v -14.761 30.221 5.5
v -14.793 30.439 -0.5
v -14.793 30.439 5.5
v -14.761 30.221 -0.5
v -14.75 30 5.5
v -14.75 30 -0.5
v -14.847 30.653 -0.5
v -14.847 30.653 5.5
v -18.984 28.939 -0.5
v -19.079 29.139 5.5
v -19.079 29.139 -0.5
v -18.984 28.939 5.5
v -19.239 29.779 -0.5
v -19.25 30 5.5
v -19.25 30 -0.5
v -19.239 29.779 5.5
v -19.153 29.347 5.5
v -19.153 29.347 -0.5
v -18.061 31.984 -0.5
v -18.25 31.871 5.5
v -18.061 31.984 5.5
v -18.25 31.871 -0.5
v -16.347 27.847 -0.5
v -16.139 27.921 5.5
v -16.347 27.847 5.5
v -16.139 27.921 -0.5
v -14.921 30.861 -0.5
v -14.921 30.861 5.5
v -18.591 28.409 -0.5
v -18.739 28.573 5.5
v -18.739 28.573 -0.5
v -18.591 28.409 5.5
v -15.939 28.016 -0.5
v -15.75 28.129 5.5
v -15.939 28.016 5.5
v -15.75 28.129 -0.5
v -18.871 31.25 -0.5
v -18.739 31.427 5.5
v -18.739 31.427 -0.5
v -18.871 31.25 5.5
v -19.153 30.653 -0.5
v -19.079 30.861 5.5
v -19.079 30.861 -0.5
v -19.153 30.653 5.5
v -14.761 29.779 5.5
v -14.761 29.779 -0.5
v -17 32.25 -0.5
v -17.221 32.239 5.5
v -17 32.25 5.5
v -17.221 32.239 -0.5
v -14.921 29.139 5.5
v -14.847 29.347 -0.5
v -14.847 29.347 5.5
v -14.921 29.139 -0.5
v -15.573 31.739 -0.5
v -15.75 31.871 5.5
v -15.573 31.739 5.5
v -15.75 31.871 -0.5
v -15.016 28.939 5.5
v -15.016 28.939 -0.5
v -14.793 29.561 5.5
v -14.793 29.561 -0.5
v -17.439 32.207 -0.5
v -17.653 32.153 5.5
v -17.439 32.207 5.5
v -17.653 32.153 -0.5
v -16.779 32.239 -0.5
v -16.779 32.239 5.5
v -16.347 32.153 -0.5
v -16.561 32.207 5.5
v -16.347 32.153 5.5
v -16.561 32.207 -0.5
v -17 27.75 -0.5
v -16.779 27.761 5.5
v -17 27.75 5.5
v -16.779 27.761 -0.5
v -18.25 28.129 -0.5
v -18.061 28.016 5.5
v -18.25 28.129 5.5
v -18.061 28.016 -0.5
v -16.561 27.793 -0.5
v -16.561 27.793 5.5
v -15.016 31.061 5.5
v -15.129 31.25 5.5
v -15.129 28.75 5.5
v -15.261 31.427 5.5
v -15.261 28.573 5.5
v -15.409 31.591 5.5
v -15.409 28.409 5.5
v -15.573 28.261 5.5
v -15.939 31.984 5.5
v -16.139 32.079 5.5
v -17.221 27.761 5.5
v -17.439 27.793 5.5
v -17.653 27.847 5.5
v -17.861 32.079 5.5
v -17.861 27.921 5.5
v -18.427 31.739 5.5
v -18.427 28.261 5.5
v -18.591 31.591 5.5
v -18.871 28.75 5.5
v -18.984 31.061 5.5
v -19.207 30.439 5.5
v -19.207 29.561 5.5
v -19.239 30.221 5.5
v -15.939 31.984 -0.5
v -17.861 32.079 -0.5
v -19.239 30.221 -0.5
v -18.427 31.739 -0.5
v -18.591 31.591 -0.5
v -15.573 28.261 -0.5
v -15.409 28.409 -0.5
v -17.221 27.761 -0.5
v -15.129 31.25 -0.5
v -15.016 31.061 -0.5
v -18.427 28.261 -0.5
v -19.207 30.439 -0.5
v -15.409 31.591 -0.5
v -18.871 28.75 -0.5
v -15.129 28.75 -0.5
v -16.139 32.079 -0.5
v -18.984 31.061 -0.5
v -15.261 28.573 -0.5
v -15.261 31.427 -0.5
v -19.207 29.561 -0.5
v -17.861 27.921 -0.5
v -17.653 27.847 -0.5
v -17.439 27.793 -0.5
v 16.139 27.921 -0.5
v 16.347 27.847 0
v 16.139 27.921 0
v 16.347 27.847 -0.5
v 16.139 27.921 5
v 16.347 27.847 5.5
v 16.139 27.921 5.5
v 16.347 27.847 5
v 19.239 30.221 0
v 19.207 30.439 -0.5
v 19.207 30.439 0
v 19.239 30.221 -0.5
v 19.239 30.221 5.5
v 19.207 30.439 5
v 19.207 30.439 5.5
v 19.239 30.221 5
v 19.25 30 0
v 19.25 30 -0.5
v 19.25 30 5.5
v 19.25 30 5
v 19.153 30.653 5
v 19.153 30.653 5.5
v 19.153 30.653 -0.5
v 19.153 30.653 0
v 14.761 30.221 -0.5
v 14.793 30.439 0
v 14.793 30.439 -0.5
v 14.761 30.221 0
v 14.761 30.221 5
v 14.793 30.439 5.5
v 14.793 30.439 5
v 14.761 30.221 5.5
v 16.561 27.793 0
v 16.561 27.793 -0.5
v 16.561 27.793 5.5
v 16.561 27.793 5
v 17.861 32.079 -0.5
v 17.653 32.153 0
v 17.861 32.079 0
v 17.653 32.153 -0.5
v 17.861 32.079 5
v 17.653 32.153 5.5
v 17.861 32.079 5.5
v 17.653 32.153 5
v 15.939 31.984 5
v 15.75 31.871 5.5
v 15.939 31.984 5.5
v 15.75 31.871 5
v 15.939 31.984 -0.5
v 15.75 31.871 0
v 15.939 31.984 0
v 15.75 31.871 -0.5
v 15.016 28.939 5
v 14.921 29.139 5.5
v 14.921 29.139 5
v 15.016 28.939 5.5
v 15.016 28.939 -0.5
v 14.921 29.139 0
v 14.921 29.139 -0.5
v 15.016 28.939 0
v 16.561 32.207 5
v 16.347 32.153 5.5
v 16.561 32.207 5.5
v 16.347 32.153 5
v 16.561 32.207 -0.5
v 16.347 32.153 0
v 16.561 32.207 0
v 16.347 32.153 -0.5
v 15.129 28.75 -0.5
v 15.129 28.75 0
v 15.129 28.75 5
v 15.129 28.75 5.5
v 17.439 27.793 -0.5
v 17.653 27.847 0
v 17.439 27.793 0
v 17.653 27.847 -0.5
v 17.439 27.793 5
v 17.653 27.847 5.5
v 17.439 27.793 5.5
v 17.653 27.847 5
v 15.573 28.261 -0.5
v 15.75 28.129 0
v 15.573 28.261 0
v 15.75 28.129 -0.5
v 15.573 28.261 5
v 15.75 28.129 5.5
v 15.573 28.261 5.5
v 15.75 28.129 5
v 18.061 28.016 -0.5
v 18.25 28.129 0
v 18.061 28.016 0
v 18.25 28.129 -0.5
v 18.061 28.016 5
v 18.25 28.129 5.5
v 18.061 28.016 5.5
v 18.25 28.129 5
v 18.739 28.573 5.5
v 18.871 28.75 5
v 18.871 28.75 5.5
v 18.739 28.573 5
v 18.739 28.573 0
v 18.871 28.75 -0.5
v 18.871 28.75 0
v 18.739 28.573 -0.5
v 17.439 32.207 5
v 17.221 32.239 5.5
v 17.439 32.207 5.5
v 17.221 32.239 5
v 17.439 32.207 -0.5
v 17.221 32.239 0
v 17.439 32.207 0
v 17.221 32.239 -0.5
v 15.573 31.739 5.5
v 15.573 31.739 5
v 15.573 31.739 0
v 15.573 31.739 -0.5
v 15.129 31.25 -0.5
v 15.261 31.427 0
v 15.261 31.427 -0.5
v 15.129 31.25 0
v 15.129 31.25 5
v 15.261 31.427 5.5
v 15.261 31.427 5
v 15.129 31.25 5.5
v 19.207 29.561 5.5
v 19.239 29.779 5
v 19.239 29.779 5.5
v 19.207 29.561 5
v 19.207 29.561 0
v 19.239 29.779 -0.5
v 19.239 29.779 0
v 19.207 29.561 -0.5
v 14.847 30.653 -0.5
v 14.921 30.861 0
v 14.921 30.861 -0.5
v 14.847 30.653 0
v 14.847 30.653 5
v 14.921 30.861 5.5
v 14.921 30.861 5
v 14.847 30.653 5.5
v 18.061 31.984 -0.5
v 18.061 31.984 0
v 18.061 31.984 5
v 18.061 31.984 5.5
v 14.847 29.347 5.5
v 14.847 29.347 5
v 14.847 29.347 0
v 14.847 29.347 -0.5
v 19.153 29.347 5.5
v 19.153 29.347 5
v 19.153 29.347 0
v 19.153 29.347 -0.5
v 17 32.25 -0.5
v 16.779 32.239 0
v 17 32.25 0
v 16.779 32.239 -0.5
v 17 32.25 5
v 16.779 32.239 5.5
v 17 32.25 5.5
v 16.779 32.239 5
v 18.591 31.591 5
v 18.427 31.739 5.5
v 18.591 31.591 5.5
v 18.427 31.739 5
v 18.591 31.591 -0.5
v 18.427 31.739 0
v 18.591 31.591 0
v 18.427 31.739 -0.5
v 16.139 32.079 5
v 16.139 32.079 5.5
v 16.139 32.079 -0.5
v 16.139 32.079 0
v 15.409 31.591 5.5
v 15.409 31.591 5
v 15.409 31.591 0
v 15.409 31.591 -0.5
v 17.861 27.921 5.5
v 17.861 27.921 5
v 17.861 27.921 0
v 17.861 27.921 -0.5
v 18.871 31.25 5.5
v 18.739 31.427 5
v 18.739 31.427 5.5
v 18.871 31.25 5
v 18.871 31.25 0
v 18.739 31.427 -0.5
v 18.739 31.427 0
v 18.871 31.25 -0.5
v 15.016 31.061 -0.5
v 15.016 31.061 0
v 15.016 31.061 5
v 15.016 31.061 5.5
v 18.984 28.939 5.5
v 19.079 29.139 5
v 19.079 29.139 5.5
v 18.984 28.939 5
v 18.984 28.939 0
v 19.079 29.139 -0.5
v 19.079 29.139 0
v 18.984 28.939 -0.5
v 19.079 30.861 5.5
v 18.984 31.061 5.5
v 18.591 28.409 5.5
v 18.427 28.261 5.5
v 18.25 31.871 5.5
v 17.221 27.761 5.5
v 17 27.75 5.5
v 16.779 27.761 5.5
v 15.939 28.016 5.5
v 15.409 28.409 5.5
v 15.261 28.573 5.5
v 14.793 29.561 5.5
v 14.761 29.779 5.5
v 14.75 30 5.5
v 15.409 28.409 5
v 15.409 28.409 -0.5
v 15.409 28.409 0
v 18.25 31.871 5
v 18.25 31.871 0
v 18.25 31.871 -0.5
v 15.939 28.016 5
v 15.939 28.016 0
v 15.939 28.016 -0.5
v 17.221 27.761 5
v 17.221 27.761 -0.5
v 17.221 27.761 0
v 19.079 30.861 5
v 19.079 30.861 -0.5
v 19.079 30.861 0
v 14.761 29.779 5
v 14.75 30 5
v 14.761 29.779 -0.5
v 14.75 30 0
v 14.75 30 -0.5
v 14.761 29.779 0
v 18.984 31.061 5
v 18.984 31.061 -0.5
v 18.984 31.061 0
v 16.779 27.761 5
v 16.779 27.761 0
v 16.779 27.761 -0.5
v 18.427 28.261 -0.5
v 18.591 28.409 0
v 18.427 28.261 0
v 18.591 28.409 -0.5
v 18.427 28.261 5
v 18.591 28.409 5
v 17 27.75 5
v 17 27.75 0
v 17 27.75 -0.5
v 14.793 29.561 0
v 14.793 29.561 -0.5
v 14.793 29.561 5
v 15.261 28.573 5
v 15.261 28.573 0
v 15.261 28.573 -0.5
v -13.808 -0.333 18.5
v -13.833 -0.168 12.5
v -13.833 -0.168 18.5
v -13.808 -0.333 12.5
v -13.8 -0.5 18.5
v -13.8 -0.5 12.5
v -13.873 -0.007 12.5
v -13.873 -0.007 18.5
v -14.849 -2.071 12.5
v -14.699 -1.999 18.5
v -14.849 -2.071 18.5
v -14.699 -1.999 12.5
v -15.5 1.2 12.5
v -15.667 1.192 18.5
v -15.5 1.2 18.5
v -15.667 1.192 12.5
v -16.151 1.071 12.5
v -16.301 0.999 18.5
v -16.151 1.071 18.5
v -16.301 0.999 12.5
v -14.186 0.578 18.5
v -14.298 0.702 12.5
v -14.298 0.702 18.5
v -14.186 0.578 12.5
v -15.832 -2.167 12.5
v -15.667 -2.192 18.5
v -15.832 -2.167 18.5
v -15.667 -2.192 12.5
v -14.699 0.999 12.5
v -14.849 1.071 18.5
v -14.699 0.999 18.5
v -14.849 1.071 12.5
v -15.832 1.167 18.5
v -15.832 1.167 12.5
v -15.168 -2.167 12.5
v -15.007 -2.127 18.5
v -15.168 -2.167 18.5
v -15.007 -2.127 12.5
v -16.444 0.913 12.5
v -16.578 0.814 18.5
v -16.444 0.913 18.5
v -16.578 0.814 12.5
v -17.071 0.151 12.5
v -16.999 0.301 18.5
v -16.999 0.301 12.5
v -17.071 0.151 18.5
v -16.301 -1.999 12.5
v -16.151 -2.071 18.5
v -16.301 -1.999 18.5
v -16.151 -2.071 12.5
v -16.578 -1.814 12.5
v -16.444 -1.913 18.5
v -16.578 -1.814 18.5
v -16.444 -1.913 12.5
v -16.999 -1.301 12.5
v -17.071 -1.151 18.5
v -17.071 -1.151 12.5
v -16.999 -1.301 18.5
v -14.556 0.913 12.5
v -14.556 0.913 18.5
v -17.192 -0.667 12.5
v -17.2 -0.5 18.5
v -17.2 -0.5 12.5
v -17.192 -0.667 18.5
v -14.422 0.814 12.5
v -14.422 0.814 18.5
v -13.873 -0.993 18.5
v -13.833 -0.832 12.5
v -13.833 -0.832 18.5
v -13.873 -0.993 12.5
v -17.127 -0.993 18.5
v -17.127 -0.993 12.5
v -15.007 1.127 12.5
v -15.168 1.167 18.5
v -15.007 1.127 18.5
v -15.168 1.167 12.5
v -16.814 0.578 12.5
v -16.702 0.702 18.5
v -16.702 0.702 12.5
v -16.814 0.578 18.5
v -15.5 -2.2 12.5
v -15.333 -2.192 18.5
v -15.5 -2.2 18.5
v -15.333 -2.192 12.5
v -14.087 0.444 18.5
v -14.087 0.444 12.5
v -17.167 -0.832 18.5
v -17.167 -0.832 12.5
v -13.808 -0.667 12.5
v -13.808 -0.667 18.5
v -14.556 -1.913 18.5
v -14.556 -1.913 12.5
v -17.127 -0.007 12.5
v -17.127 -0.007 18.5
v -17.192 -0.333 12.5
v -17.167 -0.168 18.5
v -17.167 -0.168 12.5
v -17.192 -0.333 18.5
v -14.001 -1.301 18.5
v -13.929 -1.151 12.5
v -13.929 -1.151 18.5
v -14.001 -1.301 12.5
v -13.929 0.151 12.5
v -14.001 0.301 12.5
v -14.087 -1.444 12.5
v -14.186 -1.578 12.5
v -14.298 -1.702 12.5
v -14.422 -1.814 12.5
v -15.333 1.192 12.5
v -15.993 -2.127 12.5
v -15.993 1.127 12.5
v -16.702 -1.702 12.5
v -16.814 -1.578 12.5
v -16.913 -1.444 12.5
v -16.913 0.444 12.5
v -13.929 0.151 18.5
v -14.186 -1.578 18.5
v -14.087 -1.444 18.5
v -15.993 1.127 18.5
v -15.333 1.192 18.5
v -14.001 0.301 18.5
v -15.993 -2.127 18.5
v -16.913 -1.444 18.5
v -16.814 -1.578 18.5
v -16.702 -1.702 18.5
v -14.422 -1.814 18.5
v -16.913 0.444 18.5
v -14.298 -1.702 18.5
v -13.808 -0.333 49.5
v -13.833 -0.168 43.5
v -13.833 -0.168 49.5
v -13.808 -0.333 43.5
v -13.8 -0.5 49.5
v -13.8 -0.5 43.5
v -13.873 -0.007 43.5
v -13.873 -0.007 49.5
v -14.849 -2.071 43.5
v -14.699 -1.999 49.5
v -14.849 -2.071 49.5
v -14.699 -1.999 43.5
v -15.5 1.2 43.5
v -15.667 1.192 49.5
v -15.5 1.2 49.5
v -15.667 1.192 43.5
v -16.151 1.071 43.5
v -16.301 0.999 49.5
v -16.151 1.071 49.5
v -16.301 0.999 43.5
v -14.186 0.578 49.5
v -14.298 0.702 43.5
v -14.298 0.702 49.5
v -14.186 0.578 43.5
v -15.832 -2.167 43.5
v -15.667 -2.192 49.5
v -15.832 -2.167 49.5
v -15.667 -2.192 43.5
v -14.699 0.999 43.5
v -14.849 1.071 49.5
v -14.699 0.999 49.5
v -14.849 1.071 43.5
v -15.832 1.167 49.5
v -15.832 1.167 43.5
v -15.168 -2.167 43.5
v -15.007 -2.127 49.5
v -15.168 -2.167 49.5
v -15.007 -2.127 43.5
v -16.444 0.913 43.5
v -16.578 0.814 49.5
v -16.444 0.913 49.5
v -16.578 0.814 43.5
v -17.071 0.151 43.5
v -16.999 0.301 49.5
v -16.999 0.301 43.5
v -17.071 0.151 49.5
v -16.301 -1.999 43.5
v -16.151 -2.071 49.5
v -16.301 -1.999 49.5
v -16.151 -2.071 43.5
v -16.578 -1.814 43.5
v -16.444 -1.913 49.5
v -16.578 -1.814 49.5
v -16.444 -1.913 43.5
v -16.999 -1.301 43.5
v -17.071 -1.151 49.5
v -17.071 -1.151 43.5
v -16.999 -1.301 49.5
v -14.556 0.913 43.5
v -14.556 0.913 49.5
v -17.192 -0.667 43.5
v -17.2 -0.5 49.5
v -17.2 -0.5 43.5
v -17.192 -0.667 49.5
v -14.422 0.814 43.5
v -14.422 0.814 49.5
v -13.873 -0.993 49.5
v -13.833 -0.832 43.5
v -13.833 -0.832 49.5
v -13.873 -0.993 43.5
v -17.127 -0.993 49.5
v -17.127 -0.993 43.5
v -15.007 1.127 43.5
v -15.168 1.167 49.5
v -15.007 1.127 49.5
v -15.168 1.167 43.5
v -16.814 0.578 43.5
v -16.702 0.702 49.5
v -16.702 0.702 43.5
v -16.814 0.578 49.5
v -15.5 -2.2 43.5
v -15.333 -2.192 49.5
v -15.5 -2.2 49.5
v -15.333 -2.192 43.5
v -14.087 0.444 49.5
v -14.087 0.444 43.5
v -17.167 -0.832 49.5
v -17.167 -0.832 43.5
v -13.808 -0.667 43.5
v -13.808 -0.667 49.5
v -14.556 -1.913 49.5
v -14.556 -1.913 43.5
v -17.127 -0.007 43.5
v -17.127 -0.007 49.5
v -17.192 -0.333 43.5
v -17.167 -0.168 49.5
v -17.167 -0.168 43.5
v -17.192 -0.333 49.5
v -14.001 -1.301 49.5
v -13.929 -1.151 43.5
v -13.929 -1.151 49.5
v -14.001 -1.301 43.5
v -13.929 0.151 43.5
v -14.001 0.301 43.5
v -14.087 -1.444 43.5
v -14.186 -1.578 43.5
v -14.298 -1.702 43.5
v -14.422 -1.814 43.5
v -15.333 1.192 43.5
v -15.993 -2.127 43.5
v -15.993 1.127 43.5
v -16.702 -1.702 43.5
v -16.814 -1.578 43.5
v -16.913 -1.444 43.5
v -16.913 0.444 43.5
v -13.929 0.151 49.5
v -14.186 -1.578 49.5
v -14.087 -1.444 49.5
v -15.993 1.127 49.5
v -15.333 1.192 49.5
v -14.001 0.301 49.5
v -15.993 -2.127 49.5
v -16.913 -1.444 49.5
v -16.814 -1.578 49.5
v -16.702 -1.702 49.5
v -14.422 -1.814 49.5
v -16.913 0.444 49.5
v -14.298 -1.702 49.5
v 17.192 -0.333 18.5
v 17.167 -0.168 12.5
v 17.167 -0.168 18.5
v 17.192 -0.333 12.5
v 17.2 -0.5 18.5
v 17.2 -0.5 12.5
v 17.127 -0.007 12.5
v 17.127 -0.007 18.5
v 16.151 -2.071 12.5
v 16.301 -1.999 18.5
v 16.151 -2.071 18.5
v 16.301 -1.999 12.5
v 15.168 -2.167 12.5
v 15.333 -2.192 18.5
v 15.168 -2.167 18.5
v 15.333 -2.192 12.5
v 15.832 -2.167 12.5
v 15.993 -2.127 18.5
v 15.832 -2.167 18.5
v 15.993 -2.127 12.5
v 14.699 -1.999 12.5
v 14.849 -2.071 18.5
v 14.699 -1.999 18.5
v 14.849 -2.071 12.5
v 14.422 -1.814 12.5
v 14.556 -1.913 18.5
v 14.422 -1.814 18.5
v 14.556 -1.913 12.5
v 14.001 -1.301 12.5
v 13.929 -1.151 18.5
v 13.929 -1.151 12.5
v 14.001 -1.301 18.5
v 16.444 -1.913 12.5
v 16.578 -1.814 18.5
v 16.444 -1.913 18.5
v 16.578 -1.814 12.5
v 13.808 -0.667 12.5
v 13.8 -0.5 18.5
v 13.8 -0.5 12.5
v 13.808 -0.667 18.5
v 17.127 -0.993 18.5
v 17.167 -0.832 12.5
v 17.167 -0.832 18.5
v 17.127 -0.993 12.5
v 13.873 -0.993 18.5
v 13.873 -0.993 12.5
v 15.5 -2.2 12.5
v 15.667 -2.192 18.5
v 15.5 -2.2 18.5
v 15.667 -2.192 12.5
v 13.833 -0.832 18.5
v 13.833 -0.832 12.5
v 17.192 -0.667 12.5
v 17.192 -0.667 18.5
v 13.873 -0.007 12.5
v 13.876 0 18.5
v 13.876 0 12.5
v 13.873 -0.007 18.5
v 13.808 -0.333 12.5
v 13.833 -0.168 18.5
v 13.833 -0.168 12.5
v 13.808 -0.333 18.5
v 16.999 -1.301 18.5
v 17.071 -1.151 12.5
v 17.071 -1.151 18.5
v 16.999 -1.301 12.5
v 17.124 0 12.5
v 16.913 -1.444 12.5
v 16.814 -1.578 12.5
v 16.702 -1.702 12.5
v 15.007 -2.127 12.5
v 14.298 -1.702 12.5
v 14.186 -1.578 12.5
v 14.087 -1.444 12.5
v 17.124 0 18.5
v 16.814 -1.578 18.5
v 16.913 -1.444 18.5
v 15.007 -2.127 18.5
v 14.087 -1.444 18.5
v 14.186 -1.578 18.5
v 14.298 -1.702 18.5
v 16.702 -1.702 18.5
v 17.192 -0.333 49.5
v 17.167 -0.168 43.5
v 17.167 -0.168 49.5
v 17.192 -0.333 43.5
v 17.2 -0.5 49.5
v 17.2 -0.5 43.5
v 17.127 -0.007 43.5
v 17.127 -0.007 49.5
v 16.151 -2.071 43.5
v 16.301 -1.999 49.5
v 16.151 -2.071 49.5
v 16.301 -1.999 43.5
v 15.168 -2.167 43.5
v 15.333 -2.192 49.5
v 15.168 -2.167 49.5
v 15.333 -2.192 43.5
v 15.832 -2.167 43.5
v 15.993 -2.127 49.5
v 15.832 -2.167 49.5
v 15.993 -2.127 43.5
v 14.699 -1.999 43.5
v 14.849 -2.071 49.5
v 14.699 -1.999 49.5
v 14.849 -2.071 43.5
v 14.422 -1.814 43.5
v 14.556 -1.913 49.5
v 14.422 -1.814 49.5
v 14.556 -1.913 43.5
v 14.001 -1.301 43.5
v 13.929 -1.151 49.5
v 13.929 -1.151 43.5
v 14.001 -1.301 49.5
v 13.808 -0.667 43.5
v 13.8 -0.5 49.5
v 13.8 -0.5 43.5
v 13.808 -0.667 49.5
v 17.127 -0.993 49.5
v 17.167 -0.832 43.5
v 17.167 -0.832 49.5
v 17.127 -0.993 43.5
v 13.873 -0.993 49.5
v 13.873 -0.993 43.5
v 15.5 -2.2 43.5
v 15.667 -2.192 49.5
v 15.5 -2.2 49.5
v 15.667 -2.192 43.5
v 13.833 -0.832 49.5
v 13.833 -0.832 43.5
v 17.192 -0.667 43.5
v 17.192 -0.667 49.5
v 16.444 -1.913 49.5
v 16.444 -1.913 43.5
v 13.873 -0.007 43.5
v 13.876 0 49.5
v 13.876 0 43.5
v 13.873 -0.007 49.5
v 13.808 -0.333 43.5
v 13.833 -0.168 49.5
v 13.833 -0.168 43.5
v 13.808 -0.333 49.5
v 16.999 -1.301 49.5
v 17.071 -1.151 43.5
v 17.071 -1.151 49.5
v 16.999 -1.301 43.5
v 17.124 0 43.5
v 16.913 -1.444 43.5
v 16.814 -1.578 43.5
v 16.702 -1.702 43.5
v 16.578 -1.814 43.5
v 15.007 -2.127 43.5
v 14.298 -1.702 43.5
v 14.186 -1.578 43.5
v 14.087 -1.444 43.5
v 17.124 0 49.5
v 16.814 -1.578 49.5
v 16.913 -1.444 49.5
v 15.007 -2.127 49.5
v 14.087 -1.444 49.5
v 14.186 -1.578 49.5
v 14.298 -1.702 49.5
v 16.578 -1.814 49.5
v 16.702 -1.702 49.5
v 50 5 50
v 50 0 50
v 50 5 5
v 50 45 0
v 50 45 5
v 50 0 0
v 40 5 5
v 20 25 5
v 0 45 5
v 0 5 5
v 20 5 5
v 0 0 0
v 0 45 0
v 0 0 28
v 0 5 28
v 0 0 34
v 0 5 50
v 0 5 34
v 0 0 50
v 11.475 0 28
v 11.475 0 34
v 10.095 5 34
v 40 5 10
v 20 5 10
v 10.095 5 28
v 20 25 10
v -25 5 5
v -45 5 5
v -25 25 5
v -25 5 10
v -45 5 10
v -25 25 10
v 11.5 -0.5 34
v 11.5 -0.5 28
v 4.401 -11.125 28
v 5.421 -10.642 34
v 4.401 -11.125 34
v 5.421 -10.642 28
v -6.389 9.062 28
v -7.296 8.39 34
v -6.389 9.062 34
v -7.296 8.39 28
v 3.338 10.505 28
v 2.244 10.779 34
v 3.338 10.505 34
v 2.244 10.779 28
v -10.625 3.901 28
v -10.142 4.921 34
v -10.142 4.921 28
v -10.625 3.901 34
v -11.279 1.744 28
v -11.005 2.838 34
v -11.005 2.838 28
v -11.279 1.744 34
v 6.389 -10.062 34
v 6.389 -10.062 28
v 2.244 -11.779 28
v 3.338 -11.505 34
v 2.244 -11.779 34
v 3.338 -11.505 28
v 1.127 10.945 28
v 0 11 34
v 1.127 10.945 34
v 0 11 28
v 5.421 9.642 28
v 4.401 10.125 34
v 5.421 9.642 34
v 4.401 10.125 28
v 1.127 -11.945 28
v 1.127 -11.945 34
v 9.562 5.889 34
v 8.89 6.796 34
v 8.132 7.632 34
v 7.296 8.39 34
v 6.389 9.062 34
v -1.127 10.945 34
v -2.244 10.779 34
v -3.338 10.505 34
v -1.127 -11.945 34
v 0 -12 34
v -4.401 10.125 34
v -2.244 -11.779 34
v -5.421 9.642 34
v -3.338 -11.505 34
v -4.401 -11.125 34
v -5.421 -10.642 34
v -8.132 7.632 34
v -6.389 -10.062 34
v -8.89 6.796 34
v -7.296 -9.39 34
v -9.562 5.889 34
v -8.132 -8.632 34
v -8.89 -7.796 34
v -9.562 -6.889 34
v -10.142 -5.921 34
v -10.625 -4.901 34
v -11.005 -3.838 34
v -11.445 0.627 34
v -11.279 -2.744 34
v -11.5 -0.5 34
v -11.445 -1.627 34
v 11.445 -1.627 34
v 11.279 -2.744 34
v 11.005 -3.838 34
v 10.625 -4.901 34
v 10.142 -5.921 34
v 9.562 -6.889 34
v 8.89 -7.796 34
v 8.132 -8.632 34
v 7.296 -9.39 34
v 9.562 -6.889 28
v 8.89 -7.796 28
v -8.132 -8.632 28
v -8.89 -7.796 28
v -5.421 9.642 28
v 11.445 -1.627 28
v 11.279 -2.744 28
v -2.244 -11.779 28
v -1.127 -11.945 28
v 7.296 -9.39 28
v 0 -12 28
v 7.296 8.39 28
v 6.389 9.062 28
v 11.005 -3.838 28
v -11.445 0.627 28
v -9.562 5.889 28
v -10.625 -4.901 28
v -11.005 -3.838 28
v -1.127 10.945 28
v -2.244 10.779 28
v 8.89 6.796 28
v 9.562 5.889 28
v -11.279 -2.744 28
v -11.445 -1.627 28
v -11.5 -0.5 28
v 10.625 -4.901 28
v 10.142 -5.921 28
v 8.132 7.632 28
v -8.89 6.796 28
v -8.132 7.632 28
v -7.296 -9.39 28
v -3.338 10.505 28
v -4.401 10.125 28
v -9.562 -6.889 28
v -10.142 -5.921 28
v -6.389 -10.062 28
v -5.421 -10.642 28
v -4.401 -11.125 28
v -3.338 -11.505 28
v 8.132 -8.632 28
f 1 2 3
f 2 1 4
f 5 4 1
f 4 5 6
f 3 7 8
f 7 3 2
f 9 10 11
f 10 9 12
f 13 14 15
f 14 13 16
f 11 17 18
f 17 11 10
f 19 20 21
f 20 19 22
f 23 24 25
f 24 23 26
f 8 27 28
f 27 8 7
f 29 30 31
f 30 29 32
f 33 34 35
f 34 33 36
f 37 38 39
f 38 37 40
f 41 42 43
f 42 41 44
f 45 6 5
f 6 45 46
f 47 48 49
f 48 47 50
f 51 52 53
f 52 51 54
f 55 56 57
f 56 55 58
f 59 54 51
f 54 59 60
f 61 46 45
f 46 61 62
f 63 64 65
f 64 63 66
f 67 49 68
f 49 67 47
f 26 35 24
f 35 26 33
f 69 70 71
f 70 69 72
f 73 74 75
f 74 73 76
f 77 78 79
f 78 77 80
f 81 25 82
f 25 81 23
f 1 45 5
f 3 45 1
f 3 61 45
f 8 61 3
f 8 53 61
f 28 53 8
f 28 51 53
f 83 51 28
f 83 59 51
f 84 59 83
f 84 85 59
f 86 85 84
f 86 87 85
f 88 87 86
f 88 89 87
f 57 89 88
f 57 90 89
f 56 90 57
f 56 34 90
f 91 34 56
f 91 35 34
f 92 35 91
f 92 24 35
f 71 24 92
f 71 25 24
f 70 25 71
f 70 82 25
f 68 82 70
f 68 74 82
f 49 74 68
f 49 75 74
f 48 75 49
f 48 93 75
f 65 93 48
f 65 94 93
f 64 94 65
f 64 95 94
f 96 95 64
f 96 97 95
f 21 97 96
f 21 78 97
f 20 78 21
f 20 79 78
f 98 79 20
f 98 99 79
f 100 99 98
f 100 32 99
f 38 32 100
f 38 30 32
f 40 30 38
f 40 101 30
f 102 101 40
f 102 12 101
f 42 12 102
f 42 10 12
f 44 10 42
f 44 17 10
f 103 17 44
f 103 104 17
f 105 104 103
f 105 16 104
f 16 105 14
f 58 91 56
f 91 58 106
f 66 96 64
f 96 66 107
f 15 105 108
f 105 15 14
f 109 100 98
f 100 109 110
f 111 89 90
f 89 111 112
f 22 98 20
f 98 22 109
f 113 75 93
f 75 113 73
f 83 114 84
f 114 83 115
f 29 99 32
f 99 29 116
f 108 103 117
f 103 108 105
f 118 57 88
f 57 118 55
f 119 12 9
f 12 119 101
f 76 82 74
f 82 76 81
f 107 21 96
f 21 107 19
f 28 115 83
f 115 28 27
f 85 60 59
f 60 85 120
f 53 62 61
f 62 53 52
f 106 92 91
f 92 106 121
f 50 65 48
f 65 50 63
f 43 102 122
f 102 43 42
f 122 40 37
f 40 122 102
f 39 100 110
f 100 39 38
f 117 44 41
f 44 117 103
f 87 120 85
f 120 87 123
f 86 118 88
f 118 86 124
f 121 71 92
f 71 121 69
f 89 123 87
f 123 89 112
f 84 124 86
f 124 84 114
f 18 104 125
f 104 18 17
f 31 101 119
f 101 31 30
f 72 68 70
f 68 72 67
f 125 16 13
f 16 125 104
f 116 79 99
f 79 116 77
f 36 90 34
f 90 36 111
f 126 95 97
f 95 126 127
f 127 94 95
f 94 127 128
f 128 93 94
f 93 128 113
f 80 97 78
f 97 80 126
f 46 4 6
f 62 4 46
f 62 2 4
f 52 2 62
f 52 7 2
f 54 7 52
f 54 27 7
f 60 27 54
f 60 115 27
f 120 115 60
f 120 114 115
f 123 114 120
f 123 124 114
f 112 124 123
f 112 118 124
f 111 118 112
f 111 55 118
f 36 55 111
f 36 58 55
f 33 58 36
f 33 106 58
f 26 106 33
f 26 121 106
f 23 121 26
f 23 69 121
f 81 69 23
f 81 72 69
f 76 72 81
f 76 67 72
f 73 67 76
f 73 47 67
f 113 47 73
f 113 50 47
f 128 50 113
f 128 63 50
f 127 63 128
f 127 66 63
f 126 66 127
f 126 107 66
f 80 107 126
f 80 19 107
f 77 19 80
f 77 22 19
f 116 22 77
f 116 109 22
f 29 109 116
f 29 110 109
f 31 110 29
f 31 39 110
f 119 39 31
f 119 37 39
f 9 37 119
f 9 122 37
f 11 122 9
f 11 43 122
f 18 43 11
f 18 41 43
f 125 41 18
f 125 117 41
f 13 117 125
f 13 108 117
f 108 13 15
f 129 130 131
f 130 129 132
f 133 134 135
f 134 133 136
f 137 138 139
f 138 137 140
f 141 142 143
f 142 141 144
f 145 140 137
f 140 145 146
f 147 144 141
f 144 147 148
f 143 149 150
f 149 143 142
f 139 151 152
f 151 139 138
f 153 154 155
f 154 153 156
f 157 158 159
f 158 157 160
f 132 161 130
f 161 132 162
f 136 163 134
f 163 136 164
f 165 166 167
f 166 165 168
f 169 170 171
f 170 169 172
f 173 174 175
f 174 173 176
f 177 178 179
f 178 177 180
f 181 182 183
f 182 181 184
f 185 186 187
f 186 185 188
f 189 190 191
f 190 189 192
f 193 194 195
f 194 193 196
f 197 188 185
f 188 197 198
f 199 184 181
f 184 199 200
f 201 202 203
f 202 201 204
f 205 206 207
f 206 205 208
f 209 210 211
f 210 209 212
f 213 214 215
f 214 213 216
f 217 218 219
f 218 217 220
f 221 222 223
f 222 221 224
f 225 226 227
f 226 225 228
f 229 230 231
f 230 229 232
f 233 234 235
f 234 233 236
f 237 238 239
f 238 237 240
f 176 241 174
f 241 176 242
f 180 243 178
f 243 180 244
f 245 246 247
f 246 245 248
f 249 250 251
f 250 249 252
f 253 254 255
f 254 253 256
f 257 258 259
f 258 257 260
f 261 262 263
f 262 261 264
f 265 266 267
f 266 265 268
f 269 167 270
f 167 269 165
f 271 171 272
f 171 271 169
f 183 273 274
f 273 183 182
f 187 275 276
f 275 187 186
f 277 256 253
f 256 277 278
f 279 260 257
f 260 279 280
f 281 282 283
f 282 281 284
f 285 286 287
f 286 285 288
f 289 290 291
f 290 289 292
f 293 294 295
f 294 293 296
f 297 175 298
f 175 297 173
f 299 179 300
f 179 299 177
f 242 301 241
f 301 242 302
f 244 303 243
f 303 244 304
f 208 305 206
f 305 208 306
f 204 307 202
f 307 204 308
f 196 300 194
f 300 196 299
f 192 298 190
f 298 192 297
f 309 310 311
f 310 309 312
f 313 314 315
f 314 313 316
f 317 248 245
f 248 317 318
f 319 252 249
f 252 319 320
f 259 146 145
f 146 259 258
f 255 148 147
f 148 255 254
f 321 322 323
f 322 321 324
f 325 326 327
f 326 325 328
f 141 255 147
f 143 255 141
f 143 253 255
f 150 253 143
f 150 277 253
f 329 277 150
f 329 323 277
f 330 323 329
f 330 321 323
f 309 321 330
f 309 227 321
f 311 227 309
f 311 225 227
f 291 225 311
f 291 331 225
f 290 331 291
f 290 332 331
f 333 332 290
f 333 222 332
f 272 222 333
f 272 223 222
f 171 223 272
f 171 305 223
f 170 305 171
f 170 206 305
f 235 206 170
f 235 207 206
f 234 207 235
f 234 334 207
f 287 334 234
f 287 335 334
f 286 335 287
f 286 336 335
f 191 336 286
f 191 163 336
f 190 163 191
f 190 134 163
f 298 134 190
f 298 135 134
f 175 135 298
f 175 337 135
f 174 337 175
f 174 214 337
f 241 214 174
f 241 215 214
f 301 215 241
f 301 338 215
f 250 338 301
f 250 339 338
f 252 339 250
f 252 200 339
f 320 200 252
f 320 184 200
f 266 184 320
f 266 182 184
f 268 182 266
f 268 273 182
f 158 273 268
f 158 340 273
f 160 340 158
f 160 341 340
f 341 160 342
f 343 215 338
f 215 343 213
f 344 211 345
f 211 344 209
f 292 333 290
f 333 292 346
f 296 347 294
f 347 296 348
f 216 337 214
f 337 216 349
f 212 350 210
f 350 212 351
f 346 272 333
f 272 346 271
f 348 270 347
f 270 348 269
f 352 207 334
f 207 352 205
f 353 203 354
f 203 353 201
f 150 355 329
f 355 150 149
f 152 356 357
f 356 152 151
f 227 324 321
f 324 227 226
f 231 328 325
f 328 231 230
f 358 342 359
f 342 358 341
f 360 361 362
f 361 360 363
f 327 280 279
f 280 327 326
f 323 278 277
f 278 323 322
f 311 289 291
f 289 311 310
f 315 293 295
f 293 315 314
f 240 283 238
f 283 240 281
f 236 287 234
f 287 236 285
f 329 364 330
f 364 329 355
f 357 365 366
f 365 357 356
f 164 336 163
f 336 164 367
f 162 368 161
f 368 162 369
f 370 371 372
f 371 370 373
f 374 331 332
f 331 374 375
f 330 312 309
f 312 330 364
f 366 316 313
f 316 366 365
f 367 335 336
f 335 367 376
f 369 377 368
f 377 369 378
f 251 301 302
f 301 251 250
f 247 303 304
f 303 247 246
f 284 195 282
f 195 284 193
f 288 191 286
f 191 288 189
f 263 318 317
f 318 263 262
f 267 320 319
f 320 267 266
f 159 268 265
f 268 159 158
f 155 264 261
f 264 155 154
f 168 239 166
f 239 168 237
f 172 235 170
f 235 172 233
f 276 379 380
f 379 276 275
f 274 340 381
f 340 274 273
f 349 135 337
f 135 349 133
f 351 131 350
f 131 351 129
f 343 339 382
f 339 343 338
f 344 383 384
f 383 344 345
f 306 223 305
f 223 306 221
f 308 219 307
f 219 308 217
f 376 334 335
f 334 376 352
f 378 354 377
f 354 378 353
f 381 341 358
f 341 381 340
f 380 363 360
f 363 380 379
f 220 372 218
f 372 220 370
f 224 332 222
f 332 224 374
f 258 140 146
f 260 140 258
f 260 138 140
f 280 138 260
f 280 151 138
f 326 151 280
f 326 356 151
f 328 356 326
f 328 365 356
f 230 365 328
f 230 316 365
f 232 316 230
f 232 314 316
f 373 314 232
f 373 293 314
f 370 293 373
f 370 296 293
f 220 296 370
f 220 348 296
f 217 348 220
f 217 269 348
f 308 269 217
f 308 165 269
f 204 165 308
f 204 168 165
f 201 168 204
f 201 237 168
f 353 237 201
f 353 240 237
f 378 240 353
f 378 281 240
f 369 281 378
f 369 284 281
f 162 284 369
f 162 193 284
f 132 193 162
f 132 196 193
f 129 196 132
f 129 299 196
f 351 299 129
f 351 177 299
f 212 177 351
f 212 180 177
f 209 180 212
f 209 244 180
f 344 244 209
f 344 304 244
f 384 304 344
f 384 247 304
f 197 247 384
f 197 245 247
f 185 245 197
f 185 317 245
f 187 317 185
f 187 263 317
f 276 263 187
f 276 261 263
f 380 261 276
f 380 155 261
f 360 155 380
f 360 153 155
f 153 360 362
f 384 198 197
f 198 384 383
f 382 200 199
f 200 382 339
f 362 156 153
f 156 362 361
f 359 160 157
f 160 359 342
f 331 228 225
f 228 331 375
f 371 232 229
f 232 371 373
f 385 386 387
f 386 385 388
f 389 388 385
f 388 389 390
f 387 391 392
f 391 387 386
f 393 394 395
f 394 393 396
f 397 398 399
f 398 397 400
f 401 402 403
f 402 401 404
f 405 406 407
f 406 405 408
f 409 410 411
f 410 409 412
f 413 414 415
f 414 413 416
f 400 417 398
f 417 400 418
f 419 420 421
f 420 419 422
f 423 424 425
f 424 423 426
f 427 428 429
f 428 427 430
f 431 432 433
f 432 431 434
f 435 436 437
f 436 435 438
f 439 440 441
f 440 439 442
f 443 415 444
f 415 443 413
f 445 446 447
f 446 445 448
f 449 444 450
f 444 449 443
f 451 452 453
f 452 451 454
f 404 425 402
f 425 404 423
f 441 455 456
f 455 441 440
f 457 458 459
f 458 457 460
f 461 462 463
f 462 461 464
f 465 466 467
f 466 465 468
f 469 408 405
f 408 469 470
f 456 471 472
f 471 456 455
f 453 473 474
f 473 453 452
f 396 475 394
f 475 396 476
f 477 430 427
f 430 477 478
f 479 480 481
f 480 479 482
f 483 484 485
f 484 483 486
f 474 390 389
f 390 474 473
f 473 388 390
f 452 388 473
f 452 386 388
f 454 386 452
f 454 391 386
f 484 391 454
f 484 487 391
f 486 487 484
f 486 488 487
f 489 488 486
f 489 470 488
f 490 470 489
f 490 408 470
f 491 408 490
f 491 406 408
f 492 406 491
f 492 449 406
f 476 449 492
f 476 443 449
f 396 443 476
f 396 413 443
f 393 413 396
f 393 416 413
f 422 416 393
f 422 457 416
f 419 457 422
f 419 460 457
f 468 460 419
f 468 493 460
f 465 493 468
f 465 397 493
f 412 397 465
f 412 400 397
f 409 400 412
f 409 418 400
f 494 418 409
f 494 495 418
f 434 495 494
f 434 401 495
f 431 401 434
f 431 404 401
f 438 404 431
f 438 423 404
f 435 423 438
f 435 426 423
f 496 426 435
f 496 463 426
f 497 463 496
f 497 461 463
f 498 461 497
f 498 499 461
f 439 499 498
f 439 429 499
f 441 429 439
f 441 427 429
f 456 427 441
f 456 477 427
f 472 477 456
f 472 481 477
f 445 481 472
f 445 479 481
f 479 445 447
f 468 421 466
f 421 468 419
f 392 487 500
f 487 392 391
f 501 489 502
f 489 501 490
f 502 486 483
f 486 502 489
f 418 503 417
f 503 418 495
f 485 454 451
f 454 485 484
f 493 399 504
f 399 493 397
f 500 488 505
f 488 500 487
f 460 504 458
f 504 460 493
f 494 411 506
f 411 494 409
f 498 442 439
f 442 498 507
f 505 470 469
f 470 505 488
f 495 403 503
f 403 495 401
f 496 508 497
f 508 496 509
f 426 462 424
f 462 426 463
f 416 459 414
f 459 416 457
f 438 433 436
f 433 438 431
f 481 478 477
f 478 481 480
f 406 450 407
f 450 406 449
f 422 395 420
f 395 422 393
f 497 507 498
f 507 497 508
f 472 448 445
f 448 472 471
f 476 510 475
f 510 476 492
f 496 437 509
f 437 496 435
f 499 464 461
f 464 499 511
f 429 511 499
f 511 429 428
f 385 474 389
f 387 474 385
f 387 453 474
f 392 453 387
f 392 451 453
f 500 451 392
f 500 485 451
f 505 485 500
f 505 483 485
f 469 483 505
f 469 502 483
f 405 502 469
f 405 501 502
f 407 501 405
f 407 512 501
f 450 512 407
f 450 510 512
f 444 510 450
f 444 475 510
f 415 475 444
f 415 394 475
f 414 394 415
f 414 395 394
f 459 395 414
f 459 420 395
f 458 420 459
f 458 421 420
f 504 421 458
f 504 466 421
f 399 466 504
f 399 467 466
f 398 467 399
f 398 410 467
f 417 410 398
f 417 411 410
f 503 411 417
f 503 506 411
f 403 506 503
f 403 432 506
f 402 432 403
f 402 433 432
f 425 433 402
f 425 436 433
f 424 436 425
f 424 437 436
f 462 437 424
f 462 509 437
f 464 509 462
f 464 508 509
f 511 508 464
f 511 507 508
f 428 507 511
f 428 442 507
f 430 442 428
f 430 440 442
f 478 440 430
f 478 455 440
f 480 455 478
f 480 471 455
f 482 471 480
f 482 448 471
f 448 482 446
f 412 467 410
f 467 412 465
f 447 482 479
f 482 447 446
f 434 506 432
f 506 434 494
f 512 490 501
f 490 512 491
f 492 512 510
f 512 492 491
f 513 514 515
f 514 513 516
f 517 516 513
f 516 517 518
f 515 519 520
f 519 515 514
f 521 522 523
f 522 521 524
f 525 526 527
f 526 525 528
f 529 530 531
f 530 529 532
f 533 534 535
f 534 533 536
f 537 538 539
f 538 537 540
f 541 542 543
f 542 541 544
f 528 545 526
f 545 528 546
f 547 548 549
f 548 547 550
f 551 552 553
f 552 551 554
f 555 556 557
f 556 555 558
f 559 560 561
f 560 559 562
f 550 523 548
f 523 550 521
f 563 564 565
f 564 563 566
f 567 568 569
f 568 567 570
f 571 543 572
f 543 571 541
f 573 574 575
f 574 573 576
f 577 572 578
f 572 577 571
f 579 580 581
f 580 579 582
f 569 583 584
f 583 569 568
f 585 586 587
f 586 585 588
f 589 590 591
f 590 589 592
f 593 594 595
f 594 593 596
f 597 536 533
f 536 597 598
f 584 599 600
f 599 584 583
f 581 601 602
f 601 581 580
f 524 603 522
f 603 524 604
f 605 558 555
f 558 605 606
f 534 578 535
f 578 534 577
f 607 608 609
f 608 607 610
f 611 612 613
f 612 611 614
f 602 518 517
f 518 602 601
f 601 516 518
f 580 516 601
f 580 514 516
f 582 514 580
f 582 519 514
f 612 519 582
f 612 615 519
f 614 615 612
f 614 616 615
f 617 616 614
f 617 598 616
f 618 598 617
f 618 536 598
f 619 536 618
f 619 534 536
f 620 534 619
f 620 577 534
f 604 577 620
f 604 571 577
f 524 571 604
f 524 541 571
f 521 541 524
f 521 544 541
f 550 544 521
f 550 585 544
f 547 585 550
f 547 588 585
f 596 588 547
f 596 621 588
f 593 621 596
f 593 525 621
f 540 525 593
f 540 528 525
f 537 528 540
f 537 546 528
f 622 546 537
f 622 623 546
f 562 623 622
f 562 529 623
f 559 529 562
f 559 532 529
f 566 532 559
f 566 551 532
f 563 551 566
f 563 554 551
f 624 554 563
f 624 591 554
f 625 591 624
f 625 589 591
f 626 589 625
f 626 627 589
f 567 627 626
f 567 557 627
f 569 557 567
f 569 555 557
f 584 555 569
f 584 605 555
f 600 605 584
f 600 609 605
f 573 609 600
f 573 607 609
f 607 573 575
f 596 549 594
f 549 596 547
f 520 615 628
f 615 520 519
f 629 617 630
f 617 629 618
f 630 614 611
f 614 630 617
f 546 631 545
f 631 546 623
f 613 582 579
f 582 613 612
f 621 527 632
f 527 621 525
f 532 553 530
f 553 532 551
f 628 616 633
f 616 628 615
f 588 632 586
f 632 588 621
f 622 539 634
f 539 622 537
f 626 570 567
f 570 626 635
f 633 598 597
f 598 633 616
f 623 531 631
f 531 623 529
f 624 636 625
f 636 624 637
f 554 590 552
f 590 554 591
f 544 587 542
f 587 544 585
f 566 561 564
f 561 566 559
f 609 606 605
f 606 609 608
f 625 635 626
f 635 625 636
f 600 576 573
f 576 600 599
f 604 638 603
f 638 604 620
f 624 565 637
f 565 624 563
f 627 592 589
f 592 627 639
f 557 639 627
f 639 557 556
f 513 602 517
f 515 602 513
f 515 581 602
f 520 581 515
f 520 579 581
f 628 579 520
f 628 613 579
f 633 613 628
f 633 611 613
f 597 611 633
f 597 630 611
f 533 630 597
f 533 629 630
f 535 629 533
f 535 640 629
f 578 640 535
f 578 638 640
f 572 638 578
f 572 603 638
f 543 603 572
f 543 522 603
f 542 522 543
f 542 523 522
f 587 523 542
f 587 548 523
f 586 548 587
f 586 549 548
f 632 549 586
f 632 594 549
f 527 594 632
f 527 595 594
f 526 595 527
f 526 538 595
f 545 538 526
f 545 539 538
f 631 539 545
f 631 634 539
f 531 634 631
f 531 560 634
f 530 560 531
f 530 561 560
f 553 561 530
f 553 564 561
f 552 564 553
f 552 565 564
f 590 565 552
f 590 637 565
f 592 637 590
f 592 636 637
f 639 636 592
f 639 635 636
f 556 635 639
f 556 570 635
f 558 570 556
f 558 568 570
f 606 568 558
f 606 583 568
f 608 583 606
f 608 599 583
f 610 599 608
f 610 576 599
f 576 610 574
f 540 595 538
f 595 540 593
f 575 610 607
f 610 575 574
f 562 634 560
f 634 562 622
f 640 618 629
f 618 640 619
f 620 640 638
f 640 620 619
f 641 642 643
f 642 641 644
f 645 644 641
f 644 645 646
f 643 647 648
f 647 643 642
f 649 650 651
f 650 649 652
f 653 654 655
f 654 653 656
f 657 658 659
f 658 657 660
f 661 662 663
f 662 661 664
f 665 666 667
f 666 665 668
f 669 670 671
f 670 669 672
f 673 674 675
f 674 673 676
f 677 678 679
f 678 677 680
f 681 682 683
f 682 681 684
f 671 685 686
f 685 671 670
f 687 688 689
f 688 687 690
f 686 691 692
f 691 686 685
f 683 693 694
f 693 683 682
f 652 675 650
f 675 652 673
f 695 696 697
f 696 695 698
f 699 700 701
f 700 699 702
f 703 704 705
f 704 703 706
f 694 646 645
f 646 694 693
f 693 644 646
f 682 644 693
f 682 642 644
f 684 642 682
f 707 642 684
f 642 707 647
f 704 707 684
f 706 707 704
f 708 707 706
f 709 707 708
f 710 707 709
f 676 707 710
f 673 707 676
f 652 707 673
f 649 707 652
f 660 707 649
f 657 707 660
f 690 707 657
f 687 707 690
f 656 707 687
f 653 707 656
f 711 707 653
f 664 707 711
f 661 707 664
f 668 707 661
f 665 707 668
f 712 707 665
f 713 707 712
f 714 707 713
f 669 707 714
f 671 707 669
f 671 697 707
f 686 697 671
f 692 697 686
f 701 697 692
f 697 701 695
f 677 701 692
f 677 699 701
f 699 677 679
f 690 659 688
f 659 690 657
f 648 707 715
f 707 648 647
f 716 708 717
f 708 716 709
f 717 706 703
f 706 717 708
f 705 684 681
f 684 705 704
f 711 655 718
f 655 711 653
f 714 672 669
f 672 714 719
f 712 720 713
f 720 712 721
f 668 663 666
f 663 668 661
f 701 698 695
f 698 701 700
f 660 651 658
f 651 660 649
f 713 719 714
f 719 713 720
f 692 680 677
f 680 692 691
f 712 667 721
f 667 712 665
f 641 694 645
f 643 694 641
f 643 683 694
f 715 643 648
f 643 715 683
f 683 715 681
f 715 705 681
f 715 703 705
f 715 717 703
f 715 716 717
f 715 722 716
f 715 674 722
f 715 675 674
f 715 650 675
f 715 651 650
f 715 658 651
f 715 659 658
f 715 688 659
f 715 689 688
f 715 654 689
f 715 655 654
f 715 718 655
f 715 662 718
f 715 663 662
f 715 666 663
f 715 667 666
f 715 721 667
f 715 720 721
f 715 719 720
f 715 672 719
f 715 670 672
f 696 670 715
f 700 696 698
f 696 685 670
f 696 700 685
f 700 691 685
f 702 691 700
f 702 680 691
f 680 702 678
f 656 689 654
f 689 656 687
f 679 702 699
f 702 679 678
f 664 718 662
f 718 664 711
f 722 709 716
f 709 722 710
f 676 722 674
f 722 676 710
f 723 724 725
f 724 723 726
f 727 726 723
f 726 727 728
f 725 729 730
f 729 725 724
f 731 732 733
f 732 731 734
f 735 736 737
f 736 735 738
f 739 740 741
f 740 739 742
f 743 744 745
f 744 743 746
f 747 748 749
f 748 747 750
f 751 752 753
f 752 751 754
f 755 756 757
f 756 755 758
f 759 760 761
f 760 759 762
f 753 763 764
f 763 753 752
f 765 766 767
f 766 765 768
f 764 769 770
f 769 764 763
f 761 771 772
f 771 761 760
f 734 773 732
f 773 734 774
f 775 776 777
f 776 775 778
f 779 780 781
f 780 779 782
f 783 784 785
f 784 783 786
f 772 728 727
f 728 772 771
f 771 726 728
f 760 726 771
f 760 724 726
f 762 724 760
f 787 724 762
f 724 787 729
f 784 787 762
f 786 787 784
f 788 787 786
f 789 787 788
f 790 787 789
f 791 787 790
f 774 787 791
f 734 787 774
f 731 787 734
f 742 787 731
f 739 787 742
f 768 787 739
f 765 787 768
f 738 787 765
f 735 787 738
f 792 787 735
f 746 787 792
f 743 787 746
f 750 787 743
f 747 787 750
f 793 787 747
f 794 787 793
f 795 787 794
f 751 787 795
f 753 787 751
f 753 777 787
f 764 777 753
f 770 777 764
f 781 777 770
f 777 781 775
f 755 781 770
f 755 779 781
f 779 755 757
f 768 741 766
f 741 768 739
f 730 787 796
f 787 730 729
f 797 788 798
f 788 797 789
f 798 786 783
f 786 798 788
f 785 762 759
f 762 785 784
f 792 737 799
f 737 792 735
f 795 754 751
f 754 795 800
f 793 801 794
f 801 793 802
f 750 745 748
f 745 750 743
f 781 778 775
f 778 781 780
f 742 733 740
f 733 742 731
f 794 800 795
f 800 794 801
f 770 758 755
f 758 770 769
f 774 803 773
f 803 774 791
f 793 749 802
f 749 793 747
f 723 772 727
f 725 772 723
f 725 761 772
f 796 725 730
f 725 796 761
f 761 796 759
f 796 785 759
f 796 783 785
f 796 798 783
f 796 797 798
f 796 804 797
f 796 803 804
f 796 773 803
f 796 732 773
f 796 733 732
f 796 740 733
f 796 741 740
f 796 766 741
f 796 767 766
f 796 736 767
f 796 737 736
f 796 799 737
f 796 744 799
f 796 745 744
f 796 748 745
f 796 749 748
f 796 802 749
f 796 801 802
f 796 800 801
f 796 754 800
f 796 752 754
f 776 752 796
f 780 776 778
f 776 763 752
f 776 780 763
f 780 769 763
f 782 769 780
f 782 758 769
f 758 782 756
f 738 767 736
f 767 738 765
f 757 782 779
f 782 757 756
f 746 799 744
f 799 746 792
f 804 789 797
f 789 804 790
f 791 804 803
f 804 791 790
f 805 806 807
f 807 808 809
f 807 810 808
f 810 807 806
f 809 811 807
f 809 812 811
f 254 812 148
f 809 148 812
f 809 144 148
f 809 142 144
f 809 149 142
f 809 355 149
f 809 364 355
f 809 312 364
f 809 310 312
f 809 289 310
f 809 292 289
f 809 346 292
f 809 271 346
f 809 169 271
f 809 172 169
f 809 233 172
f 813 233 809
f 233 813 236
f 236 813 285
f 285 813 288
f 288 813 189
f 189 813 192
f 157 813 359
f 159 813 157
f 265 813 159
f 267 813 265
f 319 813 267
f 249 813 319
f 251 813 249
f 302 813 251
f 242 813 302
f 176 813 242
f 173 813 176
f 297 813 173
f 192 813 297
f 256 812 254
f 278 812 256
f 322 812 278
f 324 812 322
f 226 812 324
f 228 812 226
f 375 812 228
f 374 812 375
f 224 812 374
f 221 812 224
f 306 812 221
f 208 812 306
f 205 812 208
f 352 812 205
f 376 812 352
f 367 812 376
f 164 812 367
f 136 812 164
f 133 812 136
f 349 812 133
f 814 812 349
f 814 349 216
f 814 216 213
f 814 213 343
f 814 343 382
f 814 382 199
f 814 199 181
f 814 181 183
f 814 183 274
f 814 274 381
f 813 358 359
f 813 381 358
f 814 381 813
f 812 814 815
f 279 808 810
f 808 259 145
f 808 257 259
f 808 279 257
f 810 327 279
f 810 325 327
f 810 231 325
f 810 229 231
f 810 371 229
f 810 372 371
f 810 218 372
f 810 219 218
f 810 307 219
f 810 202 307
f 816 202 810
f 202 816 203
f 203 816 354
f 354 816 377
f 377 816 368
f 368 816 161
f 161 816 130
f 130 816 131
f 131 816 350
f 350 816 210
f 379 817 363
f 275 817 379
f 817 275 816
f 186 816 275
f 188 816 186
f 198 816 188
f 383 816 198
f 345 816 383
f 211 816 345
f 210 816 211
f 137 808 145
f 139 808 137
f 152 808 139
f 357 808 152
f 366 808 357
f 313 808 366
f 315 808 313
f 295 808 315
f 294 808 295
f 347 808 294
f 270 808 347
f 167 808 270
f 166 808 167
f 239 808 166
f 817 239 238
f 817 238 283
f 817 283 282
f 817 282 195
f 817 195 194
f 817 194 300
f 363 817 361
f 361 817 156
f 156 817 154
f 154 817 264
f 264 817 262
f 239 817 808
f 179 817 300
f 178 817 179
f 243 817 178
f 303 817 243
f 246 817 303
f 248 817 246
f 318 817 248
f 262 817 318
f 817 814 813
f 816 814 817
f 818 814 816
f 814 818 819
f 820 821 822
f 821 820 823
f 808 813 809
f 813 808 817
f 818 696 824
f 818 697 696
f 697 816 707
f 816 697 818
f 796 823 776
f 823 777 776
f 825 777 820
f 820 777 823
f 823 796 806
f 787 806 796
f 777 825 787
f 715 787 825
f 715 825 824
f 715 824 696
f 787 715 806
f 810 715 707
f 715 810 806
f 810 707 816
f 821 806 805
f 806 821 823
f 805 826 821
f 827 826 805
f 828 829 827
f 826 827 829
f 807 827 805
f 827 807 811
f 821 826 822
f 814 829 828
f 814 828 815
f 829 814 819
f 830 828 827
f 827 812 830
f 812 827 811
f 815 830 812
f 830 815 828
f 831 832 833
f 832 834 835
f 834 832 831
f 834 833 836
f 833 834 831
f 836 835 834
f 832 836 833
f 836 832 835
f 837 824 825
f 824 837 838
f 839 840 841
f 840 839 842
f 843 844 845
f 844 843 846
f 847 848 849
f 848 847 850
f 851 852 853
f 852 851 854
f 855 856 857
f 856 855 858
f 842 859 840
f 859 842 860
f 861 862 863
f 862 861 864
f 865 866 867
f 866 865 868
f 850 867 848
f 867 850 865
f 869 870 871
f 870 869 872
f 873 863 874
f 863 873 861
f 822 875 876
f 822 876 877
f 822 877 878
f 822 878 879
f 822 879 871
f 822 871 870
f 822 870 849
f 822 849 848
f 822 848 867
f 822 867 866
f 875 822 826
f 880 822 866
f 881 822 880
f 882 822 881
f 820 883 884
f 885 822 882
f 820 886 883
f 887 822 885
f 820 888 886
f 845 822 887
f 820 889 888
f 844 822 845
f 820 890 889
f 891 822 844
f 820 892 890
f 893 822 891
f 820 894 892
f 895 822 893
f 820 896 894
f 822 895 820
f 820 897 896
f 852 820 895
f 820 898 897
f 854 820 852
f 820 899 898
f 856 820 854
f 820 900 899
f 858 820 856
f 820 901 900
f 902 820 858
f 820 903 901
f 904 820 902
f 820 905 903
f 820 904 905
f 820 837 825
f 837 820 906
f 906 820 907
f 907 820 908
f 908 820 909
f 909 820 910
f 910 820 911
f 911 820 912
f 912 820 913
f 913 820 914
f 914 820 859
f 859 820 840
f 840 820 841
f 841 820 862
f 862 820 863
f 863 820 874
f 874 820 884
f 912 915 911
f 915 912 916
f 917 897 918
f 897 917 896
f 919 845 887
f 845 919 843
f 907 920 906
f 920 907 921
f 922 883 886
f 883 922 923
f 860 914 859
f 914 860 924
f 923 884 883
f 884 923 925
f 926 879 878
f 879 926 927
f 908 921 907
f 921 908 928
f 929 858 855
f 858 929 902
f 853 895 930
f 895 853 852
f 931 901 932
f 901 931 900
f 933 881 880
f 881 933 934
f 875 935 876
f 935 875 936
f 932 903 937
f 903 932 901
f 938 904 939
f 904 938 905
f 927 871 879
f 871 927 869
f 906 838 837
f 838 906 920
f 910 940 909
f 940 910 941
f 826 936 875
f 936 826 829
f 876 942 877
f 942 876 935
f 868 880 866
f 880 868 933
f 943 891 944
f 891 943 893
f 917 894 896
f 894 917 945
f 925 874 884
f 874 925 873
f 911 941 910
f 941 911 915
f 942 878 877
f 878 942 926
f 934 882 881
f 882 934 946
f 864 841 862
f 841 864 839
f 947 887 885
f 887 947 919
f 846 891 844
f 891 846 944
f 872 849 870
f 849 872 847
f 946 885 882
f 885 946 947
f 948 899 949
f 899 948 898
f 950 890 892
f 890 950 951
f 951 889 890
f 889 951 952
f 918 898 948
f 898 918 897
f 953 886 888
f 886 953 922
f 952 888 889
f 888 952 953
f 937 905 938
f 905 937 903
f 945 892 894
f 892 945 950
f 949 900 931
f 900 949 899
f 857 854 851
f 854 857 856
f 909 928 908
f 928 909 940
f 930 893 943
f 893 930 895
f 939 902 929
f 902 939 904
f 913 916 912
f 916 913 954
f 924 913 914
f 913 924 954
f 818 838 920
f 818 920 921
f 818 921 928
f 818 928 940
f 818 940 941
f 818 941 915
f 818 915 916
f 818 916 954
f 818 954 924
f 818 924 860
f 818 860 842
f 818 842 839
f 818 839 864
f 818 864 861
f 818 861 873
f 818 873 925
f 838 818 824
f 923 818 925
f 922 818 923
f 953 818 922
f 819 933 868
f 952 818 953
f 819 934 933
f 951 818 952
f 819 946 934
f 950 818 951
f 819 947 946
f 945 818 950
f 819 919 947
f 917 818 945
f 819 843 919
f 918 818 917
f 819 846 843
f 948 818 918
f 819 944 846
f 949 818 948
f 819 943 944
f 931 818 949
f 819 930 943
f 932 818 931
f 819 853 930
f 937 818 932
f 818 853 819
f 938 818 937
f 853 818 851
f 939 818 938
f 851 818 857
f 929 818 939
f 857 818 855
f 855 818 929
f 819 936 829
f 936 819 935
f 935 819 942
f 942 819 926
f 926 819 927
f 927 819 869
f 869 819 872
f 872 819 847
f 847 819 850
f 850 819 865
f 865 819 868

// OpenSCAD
// === NEMA 17 Stepper Motor Mounting Bracket ===
// Print orientation: base plate on bed (XY plane, z=0)

// --- Base plate dimensions ---
base_x_half = 25;       // Half-width in X (total 50 mm)
base_y = 45;            // Depth in Y (0 to 45 mm)
base_z = 5;             // Thickness in Z

// --- Base plate mounting holes (M4) ---
m4_dia = 4.5;           // M4 hole diameter
m4_x = 17;              // X offset of M4 holes
m4_y = 30;              // Y position of M4 holes

// --- Vertical motor plate dimensions ---
motor_plate_x_half = 25;  // Same width as base
motor_plate_y = 5;        // Thickness (along Y, extends from y=0 to y=5)
motor_plate_z = 50;       // Height

// --- Motor centring boss hole ---
boss_dia = 23;            // Boss hole diameter
boss_x = 0;               // Centre X
boss_z = 28;              // Centre Z

// --- M3 screw holes for motor (31 mm square pattern) ---
m3_dia = 3.4;             // M3 hole diameter
m3_pattern = 31;          // Square pattern size
m3_offset = m3_pattern / 2;  // Half-pattern offset

// --- Triangular gussets ---
gusset_thickness = 5;     // Thickness in X (along base width)
gusset_leg_y = 20;        // Leg along +Y
gusset_leg_z = 20;        // Leg along +Z
gusset_x_start = 20;      // Inner X edge of gusset (right side)

// --- Global fineness ---
$fn = 64;

// === Build the part ===
union() {
    // --- Base plate ---
    translate([0, 0, 0])
        cube([base_x_half * 2, base_y, base_z], center = false);

    // --- Vertical motor plate ---
    // Extends from y=0 to y=5, z=0 to z=50, x=-25 to 25
    translate([0, 0, 0])
        cube([motor_plate_x_half * 2, motor_plate_y, motor_plate_z], center = false);

    // --- Triangular gussets ---
    // Right gusset: right triangle in YZ plane, right angle at (y=5, z=5)
    // Legs: +Y from 5 to 25, +Z from 5 to 25
    // Positioned at x = 20 to 25
    translate([gusset_x_start, 5, 5])
        linear_extrude(height = gusset_thickness, center = false)
            polygon([[0, 0], [gusset_leg_y, 0], [0, gusset_leg_z]]);

    // Left gusset: mirrored across X=0
    // The right triangle should be mirrored, so we flip the polygon
    translate([-gusset_x_start - gusset_thickness, 5, 5])
        linear_extrude(height = gusset_thickness, center = false)
            polygon([[0, 0], [-gusset_leg_y, 0], [0, gusset_leg_z]]);

    // --- Cut: M4 through-holes in base plate ---
    // These go through the base plate (z=0 to z=5) and into the motor plate
    // Extend past both faces by 0.5 mm
    for (sign = [-1, 1]) {
        translate([sign * m4_x, m4_y, -0.5])
            cylinder(d = m4_dia, h = base_z + 1, center = false);
    }

    // --- Cut: Boss hole through motor plate (along Y) ---
    // Centre at (x=0, z=28), along Y from y=0 to y=5
    // Extend past Y faces by 0.5 mm
    translate([boss_x, -0.5, boss_z])
        cylinder(d = boss_dia, h = motor_plate_y + 1, center = false, rotate = [90, 0, 0]);

    // --- Cut: M3 screw holes for motor (4 holes on 31 mm square pattern) ---
    // Centred on boss hole at (x=0, z=28)
    for (sx = [-1, 1]) {
        for (sz = [-1, 1]) {
            translate([sx * m3_offset, -0.5, boss_z + sz * m3_offset])
                cylinder(d = m3_dia, h = motor_plate_y + 1, center = false, rotate = [90, 0, 0]);
        }
    }
}
